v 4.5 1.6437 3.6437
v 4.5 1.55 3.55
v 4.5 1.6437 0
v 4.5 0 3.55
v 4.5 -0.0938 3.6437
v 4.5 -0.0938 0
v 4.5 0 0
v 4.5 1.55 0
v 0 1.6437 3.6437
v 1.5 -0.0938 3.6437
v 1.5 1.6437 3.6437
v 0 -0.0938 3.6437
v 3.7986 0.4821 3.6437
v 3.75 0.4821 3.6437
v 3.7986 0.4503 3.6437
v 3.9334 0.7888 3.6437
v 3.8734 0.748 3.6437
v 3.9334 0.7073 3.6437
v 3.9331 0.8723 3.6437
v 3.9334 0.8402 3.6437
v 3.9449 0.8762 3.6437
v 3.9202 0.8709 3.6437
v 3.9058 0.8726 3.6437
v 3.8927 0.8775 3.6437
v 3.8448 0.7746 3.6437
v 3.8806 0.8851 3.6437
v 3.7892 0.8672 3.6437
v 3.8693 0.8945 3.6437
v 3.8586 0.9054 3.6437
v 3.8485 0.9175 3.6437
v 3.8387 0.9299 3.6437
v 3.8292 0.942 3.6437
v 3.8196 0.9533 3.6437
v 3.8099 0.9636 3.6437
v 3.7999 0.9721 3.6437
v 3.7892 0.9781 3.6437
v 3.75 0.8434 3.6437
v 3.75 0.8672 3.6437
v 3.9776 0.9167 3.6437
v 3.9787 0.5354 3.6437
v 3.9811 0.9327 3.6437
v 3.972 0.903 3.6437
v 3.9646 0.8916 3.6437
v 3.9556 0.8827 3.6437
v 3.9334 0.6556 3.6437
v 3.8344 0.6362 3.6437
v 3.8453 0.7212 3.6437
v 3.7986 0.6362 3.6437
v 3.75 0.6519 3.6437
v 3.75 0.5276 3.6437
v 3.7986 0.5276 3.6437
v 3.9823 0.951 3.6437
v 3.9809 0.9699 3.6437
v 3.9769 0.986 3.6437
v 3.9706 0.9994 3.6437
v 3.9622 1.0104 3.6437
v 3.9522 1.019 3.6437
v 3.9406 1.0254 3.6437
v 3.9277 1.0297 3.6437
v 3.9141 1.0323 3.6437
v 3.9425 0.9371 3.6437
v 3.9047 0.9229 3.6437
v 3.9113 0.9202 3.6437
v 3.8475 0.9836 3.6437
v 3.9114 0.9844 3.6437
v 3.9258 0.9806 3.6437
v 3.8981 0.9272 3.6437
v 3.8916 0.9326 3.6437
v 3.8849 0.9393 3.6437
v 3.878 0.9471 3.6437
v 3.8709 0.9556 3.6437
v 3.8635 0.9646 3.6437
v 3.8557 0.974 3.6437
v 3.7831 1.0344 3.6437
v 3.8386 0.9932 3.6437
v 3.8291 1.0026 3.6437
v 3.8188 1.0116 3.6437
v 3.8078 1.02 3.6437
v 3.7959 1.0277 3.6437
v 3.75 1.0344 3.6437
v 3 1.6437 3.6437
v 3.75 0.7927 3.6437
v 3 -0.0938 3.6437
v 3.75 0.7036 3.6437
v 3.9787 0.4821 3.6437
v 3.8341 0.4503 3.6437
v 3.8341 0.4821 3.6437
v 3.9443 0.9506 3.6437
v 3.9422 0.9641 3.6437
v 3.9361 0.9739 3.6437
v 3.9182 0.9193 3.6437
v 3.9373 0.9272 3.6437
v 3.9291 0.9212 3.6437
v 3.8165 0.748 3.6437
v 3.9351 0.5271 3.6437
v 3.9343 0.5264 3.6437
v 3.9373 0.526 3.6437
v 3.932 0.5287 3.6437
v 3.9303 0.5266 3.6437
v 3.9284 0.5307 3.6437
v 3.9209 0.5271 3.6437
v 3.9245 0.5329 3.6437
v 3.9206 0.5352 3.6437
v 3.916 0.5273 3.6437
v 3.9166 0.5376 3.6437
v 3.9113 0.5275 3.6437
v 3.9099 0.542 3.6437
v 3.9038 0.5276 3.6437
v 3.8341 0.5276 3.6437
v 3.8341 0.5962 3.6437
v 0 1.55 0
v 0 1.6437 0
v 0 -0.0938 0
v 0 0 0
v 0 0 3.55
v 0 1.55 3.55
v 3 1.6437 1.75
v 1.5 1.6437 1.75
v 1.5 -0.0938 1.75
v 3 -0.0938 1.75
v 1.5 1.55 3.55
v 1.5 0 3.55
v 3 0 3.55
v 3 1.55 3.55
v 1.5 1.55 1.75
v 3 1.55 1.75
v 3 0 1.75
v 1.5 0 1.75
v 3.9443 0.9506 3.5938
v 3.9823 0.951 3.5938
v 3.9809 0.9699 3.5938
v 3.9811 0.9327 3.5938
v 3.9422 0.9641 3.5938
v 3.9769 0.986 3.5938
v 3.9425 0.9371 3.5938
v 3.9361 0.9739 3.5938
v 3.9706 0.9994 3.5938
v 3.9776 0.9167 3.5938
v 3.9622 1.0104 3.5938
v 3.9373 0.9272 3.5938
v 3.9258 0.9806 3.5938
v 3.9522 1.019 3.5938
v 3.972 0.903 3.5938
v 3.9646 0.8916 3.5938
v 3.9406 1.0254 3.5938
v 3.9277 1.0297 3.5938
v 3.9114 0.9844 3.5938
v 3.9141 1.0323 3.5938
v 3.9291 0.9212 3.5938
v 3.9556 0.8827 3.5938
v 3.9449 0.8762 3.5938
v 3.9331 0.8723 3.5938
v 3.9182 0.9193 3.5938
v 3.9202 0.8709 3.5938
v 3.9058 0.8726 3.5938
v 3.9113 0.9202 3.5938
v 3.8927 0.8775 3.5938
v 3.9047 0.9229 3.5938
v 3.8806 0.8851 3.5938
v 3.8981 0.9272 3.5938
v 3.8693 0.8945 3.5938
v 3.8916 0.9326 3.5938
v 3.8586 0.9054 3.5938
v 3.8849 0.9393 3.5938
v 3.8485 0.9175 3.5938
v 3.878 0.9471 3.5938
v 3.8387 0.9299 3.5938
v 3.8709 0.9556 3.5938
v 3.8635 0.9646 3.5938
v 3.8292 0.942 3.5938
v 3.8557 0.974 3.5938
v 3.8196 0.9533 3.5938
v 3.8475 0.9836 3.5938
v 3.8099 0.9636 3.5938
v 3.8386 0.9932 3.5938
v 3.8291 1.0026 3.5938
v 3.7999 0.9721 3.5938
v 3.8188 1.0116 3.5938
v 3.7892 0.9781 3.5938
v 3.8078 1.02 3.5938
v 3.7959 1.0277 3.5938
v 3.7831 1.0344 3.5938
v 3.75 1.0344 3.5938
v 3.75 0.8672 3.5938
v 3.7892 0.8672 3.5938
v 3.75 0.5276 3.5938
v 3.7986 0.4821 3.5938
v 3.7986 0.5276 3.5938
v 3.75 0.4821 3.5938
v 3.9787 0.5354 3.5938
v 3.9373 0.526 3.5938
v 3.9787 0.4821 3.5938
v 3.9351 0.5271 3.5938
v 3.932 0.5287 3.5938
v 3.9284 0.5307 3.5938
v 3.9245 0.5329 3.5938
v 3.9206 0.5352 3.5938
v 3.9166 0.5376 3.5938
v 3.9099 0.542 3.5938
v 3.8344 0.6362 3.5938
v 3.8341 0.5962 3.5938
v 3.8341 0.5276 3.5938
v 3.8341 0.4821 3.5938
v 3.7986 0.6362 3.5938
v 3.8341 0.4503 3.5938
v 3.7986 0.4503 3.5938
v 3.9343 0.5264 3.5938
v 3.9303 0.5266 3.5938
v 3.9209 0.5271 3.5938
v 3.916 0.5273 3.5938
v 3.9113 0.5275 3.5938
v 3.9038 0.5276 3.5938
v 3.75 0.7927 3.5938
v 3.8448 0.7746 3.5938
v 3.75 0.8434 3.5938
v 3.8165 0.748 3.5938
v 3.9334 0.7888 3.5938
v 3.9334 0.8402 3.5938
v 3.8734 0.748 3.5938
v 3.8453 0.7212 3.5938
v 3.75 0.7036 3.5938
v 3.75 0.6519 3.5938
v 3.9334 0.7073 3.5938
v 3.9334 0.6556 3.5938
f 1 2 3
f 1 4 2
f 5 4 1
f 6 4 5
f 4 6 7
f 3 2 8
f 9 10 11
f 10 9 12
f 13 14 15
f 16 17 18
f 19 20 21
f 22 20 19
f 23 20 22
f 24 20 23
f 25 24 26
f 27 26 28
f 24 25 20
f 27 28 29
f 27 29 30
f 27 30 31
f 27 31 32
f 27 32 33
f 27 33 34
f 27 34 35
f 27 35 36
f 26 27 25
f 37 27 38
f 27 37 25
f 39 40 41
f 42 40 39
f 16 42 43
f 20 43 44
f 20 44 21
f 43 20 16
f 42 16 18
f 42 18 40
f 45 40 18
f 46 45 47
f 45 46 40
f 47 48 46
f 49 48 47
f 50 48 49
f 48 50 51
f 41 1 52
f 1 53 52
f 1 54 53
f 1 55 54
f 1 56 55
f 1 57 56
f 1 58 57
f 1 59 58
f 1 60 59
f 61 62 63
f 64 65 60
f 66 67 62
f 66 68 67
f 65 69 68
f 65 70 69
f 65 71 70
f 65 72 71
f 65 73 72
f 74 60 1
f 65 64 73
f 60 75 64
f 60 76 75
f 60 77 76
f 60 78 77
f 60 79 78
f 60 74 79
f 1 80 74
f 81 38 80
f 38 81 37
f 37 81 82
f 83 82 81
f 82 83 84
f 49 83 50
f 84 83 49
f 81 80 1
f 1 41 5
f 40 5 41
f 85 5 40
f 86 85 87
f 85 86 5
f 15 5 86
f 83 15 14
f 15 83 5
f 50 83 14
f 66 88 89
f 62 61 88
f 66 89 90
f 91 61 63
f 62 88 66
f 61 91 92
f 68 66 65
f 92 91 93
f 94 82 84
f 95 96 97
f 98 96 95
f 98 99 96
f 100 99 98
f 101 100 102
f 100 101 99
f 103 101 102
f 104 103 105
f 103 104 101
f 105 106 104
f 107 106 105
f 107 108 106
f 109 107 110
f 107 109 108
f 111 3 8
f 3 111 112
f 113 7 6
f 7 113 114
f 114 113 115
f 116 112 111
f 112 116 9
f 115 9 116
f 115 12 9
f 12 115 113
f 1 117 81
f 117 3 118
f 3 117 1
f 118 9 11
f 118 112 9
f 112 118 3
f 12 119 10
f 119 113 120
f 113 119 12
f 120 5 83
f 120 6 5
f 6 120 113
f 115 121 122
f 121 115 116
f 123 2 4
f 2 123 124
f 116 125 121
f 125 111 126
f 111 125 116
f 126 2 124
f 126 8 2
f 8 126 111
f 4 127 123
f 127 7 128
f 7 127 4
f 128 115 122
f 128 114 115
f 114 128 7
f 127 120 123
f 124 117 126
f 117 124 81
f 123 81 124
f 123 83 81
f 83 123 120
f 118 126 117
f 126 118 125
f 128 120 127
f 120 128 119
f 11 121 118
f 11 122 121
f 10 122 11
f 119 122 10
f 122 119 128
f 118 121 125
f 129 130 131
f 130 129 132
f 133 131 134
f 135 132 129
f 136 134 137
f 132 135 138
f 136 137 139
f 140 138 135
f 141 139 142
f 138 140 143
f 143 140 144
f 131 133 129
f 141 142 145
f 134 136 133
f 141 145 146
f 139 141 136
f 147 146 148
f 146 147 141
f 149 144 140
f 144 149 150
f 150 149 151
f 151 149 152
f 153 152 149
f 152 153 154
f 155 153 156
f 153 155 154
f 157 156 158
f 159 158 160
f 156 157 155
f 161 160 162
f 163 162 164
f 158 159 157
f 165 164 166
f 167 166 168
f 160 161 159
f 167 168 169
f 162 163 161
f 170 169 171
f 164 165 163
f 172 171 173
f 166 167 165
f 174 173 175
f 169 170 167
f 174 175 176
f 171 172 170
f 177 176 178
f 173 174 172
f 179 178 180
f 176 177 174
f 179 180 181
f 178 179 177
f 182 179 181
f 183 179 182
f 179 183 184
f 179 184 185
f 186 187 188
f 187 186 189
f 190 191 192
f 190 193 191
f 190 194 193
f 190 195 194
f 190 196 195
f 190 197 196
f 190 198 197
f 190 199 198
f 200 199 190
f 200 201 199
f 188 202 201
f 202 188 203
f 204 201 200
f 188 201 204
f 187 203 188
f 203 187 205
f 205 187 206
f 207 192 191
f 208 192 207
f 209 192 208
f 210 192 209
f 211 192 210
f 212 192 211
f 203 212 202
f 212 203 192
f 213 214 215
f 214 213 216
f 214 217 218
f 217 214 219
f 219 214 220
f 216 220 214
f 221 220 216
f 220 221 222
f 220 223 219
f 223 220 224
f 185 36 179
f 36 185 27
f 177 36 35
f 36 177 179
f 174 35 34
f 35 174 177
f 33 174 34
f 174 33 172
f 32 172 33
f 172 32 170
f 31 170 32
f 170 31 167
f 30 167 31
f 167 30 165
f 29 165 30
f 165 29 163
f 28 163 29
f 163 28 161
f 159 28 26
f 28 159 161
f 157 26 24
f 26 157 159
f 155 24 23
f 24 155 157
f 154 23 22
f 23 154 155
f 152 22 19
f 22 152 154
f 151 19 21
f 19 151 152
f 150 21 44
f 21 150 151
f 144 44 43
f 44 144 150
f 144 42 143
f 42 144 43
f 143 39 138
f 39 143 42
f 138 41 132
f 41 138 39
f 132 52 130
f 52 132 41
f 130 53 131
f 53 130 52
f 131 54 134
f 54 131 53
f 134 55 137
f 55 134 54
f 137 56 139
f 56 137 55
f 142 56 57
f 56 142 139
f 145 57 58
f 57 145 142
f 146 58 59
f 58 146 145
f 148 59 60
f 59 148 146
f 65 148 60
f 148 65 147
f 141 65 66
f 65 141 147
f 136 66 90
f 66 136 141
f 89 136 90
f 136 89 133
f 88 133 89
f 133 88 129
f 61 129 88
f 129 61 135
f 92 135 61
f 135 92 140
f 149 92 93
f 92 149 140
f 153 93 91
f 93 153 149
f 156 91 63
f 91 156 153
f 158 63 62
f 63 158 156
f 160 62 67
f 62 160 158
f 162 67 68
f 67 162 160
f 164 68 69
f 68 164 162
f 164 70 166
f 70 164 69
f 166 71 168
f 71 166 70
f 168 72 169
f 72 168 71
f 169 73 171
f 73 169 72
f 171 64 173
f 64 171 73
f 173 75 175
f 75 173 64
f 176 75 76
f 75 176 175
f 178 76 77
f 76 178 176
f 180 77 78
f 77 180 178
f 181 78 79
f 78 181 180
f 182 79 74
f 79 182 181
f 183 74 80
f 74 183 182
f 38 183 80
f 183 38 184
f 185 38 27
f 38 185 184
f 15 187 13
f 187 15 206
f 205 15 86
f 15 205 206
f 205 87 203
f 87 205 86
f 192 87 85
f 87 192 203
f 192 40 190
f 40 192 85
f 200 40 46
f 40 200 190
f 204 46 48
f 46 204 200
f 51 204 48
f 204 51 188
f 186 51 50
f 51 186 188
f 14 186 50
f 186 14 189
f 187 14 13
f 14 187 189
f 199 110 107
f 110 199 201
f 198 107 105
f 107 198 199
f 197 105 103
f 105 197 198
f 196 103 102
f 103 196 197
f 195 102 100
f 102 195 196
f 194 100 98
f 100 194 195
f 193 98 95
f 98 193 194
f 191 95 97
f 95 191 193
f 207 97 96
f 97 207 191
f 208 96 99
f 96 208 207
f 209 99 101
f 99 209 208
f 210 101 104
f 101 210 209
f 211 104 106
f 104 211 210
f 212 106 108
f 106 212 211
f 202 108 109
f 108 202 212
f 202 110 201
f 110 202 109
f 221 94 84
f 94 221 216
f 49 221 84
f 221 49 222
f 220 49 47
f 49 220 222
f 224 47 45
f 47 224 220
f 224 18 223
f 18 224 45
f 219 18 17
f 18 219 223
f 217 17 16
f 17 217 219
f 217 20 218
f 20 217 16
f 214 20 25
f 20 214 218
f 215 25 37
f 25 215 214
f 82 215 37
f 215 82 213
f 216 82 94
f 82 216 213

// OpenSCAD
// file: config.scad
// All dimensions in INCHES
convert_to_mm = false;

nominal_size = "2x4"; // name of the nominal size
board_wide_face = 3.5; // nominal 4"
board_narrow_face = 1.5; // nominal 2"

/*
This defines how much larger the inner dimensions of the template are than the
board, to account for slightly oversize boards or moisture swelling. Measuring
my current batch of 2x4s with calipers, I found that setting the calipers at
3.55" for the wide face, and 1.55" for the narrow face, let them slide over
all of the boards. So, we set the padding to 0.05".
*/
template_padding = 0.05;

// Thickness of the template walls
template_wall_thickness = 3/32;

// Length of the depth template
template_length = 4.0;

// Width of the cut in the depth gauge
saw_kerf = 0.2;

// Diameter of the router bit hole in the depth gauge
router_bit_dia = 1.4;

// Height of raised text
text_height = 1/16;
// file: modules/as_mm.scad
module as_mm(convert_to_mm = false) {
    if(convert_to_mm == false) {
        children();
    } else {
        scale([25.4,25.4,25.4]){ // inches to mm
            children();
        }
    }
}
// main file
use <modules/as_mm.scad>
include <config.scad>

as_mm(convert_to_mm) {
    template_depth = board_narrow_face * 3;
    difference() {
        // this cube represents the walls of the template. It will have no bottom
        translate([0,-1 * template_wall_thickness,0]){
            cube([
              template_depth,
              board_narrow_face + template_padding + (template_wall_thickness * 2),
              board_wide_face + template_padding + template_wall_thickness
            ]);
        }
        // this cube represents the inner face of the template, touching the lumber
        cube([template_depth, board_narrow_face + template_padding, board_wide_face + template_padding]);
        // cut-out for marking wide-face half-lap inner edge
        translate([board_narrow_face,-1 * template_wall_thickness, board_wide_face * 0.5]){
            cube([
              board_narrow_face,
              board_narrow_face + template_padding + (2 * template_wall_thickness),
              board_wide_face
            ]);
        }
        // nominal dimension text
        translate([
          board_narrow_face * 2.5,
          board_narrow_face / 2,
          board_wide_face + template_wall_thickness
        ]){
            rotate([0,0,-90]){
                #linear_extrude(2 * template_wall_thickness){
                    text(nominal_size, size=0.25, font="Liberation Mono:style=Bold", halign="center", valign="bottom");
                }
            }
        }
        // URL text doesn't fit
    }
}
